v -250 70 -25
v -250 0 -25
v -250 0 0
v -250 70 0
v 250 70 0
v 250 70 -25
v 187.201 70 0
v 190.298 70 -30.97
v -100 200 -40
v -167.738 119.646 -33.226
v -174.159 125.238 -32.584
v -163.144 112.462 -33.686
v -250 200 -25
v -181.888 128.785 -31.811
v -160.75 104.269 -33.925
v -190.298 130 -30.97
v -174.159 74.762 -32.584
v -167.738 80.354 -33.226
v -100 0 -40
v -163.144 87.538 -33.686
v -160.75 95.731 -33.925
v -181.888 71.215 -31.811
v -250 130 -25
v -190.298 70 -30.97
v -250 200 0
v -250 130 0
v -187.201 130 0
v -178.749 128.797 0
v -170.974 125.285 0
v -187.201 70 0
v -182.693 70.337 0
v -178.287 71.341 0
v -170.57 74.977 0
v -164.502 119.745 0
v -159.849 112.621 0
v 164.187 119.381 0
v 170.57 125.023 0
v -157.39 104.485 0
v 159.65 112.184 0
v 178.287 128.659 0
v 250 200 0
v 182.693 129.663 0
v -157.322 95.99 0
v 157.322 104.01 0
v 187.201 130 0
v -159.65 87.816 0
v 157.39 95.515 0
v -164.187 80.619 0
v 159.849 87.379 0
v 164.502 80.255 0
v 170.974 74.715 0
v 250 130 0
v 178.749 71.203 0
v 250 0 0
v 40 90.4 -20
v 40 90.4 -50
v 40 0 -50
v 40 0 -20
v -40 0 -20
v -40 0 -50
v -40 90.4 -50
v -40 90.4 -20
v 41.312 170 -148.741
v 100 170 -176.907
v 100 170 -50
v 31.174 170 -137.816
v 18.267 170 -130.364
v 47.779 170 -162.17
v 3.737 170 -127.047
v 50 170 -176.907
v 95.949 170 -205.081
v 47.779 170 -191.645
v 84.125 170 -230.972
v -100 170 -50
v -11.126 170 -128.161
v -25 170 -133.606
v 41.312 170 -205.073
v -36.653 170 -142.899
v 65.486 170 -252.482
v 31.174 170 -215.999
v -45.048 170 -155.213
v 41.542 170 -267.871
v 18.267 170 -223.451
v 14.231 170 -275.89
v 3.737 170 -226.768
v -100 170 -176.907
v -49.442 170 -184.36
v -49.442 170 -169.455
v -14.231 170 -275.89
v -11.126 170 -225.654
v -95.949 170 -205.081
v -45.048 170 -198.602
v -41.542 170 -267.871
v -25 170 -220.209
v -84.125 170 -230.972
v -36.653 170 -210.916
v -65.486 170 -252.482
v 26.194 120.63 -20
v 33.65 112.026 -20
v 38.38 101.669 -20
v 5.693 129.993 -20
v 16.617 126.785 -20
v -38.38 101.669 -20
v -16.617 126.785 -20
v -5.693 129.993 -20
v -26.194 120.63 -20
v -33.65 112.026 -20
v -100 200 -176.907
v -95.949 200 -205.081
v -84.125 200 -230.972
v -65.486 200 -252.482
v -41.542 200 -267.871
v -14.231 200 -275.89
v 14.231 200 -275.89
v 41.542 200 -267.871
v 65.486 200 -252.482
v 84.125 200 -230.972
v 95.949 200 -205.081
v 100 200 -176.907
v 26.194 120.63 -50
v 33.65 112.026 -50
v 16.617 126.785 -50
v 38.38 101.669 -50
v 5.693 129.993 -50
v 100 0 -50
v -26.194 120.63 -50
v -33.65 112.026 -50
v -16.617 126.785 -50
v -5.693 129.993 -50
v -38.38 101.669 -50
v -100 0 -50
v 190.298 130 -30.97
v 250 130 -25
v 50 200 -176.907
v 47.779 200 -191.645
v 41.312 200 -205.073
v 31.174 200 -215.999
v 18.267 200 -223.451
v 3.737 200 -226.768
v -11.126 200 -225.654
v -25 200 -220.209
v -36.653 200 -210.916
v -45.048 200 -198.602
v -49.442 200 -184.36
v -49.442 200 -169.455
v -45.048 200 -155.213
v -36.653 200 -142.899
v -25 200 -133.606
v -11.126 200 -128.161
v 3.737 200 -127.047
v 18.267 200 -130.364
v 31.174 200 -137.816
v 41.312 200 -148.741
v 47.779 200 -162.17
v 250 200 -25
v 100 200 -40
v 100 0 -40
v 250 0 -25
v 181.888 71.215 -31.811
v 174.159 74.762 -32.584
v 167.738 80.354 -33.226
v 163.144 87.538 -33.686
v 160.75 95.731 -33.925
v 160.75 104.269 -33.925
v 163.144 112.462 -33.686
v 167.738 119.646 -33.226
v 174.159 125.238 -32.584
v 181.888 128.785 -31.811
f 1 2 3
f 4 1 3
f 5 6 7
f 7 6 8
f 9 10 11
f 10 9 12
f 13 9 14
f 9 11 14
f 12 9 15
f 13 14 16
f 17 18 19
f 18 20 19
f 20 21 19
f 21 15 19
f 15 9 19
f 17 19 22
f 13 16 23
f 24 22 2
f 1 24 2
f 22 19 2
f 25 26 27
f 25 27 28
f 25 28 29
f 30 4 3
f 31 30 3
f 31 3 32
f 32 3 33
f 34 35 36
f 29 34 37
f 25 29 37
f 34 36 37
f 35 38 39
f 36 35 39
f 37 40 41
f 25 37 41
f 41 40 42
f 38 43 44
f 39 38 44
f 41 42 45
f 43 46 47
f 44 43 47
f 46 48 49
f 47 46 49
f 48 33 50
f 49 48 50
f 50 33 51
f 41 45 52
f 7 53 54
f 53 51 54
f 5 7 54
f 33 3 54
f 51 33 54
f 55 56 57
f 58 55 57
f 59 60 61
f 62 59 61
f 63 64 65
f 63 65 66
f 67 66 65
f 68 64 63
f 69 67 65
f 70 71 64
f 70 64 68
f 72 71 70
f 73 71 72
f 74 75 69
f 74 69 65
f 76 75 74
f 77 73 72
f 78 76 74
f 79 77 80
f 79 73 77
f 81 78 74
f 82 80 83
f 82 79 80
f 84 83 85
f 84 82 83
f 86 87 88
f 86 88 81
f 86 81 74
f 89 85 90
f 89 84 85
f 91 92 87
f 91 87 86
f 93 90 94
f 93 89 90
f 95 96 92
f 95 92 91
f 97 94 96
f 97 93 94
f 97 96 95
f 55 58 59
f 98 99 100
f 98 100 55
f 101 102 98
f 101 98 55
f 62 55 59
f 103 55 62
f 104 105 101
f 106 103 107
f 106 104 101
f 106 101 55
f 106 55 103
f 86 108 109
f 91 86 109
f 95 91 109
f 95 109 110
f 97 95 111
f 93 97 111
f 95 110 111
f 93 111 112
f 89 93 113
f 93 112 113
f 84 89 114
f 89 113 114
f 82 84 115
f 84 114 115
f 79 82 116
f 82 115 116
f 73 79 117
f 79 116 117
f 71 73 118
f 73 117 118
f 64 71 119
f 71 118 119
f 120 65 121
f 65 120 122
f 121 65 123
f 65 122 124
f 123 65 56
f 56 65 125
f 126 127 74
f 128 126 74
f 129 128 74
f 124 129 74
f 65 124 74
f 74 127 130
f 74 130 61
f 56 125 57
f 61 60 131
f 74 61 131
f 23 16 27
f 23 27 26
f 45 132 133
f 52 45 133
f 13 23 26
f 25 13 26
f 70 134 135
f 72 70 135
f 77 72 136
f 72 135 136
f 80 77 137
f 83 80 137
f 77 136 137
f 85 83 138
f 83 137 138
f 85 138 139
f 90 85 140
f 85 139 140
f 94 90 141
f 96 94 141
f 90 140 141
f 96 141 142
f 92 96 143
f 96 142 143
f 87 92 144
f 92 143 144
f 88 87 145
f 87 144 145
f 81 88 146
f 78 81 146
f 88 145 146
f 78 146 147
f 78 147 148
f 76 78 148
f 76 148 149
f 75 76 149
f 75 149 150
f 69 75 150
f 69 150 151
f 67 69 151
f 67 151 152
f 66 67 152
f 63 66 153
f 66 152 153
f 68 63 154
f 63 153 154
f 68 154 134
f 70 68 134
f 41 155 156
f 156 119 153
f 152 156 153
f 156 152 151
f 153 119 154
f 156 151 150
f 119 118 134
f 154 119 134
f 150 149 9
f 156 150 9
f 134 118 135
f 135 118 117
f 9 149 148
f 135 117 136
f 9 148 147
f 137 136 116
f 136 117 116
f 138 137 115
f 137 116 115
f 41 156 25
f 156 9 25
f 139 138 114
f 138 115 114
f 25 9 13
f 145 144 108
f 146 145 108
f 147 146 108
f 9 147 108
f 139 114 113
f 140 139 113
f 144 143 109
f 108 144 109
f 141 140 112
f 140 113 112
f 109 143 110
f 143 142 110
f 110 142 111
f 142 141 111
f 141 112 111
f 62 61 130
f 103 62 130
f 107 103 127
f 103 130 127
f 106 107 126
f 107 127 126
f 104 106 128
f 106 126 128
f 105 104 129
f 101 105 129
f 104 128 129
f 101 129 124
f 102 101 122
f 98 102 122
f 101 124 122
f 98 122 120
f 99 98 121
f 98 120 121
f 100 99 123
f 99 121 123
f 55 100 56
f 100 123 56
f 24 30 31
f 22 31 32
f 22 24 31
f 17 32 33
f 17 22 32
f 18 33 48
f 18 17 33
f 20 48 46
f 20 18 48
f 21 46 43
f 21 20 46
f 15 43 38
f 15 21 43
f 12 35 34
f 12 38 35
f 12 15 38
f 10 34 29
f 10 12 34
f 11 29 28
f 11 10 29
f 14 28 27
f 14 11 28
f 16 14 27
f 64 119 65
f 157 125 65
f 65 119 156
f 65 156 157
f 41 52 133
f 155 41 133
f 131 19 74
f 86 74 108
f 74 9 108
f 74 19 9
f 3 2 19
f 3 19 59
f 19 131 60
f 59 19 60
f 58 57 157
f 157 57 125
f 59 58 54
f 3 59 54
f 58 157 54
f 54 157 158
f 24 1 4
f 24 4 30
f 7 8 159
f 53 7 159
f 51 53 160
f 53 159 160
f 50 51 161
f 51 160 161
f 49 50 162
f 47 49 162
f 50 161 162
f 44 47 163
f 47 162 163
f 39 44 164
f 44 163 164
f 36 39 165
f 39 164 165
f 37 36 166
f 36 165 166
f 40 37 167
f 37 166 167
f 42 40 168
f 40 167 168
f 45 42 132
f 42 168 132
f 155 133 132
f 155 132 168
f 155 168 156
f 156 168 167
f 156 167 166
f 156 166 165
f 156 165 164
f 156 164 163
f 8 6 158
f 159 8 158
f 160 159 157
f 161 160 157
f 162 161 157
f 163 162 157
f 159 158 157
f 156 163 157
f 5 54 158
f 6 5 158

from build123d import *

# Parameters (mm, degrees)
BOSS_EXTRUDE1_DEPTH = 200
CUT_EXTRUDE1_DEPTH  = 30
CUT_EXTRUDE2_DEPTH  = 75.627789266
CUT_EXTRUDE3_DEPTH  = 75.627789266
SKETCH5_R           = 50
BOSS_EXTRUDE2_DEPTH = 30


with BuildPart() as part:
    # Sketch1 → Boss-Extrude1 (new body)
    with BuildSketch(Plane(origin=(0, 0, 0), x_dir=(1, 0, 0), z_dir=(0, 1, 0))):
        Polygon((-250, 0), (250, 0), (250, 25), (100, 40), (100, 50), (-100, 50), (-100, 40), (-250, 25), align=None)
    extrude(amount=BOSS_EXTRUDE1_DEPTH)

    # Sketch2 → Cut-Extrude1 (cut)
    with BuildSketch(Plane(origin=(0, 0, -50), x_dir=(-1, 0, 0), z_dir=(0, 0, -1))):
        with BuildLine():
            Line((-40, 0), (40, 0))
            Line((40, 0), (40, 90.399951474))
            ThreePointArc((40, 90.399951474), (0, 130.399951474), (-40, 90.399951474))
            Line((-40, 90.399951474), (-40, 0))
        make_face()
    extrude(amount=-CUT_EXTRUDE1_DEPTH, mode=Mode.SUBTRACT)

    # Sketch3 → Cut-Extrude2 (cut, through all)
    with BuildSketch(Plane(origin=(-4.95049505, 0, -49.504950495), x_dir=(-0.99503719, 0, 0.099503719), z_dir=(-0.099503719, 0, -0.99503719))):
        with BuildLine():
            Line((186.271704577, 130), (296.385375979, 130))
            Line((296.385375979, 130), (296.385375979, 70))
            Line((296.385375979, 70), (186.271704577, 70))
            ThreePointArc((186.271704577, 70), (156.271704577, 100), (186.271704577, 130))
        make_face()
    extrude(amount=-CUT_EXTRUDE2_DEPTH, mode=Mode.SUBTRACT)

    # Sketch4 → Cut-Extrude3 (cut, through all)
    with BuildSketch(Plane(origin=(4.95049505, 0, -49.504950495), x_dir=(-0.99503719, 0, -0.099503719), z_dir=(0.099503719, 0, -0.99503719))):
        with BuildLine():
            Line((-186.271704577, 130), (-315.600266526, 130))
            Line((-315.600266526, 130), (-315.600266526, 70))
            Line((-315.600266526, 70), (-186.271704577, 70))
            ThreePointArc((-186.271704577, 70), (-156.271704577, 100), (-186.271704577, 130))
        make_face()
    extrude(amount=-CUT_EXTRUDE3_DEPTH, mode=Mode.SUBTRACT)

    # Sketch5 → Boss-Extrude2 (add)
    with BuildSketch(Plane(origin=(0, 200, 0), x_dir=(1, 0, 0), z_dir=(0, 1, 0))):
        with BuildLine():
            Line((100, 50), (-100, 50))
            Line((-100, 50), (-100, 176.90746365))
            ThreePointArc((-100, 176.90746365), (0, 276.90746365), (100, 176.90746365))
            Line((100, 176.90746365), (100, 50))
        make_face()
        with Locations((0, 176.90746365)):
            Circle(SKETCH5_R, mode=Mode.SUBTRACT)
    extrude(amount=-BOSS_EXTRUDE2_DEPTH)


solid = part.part
